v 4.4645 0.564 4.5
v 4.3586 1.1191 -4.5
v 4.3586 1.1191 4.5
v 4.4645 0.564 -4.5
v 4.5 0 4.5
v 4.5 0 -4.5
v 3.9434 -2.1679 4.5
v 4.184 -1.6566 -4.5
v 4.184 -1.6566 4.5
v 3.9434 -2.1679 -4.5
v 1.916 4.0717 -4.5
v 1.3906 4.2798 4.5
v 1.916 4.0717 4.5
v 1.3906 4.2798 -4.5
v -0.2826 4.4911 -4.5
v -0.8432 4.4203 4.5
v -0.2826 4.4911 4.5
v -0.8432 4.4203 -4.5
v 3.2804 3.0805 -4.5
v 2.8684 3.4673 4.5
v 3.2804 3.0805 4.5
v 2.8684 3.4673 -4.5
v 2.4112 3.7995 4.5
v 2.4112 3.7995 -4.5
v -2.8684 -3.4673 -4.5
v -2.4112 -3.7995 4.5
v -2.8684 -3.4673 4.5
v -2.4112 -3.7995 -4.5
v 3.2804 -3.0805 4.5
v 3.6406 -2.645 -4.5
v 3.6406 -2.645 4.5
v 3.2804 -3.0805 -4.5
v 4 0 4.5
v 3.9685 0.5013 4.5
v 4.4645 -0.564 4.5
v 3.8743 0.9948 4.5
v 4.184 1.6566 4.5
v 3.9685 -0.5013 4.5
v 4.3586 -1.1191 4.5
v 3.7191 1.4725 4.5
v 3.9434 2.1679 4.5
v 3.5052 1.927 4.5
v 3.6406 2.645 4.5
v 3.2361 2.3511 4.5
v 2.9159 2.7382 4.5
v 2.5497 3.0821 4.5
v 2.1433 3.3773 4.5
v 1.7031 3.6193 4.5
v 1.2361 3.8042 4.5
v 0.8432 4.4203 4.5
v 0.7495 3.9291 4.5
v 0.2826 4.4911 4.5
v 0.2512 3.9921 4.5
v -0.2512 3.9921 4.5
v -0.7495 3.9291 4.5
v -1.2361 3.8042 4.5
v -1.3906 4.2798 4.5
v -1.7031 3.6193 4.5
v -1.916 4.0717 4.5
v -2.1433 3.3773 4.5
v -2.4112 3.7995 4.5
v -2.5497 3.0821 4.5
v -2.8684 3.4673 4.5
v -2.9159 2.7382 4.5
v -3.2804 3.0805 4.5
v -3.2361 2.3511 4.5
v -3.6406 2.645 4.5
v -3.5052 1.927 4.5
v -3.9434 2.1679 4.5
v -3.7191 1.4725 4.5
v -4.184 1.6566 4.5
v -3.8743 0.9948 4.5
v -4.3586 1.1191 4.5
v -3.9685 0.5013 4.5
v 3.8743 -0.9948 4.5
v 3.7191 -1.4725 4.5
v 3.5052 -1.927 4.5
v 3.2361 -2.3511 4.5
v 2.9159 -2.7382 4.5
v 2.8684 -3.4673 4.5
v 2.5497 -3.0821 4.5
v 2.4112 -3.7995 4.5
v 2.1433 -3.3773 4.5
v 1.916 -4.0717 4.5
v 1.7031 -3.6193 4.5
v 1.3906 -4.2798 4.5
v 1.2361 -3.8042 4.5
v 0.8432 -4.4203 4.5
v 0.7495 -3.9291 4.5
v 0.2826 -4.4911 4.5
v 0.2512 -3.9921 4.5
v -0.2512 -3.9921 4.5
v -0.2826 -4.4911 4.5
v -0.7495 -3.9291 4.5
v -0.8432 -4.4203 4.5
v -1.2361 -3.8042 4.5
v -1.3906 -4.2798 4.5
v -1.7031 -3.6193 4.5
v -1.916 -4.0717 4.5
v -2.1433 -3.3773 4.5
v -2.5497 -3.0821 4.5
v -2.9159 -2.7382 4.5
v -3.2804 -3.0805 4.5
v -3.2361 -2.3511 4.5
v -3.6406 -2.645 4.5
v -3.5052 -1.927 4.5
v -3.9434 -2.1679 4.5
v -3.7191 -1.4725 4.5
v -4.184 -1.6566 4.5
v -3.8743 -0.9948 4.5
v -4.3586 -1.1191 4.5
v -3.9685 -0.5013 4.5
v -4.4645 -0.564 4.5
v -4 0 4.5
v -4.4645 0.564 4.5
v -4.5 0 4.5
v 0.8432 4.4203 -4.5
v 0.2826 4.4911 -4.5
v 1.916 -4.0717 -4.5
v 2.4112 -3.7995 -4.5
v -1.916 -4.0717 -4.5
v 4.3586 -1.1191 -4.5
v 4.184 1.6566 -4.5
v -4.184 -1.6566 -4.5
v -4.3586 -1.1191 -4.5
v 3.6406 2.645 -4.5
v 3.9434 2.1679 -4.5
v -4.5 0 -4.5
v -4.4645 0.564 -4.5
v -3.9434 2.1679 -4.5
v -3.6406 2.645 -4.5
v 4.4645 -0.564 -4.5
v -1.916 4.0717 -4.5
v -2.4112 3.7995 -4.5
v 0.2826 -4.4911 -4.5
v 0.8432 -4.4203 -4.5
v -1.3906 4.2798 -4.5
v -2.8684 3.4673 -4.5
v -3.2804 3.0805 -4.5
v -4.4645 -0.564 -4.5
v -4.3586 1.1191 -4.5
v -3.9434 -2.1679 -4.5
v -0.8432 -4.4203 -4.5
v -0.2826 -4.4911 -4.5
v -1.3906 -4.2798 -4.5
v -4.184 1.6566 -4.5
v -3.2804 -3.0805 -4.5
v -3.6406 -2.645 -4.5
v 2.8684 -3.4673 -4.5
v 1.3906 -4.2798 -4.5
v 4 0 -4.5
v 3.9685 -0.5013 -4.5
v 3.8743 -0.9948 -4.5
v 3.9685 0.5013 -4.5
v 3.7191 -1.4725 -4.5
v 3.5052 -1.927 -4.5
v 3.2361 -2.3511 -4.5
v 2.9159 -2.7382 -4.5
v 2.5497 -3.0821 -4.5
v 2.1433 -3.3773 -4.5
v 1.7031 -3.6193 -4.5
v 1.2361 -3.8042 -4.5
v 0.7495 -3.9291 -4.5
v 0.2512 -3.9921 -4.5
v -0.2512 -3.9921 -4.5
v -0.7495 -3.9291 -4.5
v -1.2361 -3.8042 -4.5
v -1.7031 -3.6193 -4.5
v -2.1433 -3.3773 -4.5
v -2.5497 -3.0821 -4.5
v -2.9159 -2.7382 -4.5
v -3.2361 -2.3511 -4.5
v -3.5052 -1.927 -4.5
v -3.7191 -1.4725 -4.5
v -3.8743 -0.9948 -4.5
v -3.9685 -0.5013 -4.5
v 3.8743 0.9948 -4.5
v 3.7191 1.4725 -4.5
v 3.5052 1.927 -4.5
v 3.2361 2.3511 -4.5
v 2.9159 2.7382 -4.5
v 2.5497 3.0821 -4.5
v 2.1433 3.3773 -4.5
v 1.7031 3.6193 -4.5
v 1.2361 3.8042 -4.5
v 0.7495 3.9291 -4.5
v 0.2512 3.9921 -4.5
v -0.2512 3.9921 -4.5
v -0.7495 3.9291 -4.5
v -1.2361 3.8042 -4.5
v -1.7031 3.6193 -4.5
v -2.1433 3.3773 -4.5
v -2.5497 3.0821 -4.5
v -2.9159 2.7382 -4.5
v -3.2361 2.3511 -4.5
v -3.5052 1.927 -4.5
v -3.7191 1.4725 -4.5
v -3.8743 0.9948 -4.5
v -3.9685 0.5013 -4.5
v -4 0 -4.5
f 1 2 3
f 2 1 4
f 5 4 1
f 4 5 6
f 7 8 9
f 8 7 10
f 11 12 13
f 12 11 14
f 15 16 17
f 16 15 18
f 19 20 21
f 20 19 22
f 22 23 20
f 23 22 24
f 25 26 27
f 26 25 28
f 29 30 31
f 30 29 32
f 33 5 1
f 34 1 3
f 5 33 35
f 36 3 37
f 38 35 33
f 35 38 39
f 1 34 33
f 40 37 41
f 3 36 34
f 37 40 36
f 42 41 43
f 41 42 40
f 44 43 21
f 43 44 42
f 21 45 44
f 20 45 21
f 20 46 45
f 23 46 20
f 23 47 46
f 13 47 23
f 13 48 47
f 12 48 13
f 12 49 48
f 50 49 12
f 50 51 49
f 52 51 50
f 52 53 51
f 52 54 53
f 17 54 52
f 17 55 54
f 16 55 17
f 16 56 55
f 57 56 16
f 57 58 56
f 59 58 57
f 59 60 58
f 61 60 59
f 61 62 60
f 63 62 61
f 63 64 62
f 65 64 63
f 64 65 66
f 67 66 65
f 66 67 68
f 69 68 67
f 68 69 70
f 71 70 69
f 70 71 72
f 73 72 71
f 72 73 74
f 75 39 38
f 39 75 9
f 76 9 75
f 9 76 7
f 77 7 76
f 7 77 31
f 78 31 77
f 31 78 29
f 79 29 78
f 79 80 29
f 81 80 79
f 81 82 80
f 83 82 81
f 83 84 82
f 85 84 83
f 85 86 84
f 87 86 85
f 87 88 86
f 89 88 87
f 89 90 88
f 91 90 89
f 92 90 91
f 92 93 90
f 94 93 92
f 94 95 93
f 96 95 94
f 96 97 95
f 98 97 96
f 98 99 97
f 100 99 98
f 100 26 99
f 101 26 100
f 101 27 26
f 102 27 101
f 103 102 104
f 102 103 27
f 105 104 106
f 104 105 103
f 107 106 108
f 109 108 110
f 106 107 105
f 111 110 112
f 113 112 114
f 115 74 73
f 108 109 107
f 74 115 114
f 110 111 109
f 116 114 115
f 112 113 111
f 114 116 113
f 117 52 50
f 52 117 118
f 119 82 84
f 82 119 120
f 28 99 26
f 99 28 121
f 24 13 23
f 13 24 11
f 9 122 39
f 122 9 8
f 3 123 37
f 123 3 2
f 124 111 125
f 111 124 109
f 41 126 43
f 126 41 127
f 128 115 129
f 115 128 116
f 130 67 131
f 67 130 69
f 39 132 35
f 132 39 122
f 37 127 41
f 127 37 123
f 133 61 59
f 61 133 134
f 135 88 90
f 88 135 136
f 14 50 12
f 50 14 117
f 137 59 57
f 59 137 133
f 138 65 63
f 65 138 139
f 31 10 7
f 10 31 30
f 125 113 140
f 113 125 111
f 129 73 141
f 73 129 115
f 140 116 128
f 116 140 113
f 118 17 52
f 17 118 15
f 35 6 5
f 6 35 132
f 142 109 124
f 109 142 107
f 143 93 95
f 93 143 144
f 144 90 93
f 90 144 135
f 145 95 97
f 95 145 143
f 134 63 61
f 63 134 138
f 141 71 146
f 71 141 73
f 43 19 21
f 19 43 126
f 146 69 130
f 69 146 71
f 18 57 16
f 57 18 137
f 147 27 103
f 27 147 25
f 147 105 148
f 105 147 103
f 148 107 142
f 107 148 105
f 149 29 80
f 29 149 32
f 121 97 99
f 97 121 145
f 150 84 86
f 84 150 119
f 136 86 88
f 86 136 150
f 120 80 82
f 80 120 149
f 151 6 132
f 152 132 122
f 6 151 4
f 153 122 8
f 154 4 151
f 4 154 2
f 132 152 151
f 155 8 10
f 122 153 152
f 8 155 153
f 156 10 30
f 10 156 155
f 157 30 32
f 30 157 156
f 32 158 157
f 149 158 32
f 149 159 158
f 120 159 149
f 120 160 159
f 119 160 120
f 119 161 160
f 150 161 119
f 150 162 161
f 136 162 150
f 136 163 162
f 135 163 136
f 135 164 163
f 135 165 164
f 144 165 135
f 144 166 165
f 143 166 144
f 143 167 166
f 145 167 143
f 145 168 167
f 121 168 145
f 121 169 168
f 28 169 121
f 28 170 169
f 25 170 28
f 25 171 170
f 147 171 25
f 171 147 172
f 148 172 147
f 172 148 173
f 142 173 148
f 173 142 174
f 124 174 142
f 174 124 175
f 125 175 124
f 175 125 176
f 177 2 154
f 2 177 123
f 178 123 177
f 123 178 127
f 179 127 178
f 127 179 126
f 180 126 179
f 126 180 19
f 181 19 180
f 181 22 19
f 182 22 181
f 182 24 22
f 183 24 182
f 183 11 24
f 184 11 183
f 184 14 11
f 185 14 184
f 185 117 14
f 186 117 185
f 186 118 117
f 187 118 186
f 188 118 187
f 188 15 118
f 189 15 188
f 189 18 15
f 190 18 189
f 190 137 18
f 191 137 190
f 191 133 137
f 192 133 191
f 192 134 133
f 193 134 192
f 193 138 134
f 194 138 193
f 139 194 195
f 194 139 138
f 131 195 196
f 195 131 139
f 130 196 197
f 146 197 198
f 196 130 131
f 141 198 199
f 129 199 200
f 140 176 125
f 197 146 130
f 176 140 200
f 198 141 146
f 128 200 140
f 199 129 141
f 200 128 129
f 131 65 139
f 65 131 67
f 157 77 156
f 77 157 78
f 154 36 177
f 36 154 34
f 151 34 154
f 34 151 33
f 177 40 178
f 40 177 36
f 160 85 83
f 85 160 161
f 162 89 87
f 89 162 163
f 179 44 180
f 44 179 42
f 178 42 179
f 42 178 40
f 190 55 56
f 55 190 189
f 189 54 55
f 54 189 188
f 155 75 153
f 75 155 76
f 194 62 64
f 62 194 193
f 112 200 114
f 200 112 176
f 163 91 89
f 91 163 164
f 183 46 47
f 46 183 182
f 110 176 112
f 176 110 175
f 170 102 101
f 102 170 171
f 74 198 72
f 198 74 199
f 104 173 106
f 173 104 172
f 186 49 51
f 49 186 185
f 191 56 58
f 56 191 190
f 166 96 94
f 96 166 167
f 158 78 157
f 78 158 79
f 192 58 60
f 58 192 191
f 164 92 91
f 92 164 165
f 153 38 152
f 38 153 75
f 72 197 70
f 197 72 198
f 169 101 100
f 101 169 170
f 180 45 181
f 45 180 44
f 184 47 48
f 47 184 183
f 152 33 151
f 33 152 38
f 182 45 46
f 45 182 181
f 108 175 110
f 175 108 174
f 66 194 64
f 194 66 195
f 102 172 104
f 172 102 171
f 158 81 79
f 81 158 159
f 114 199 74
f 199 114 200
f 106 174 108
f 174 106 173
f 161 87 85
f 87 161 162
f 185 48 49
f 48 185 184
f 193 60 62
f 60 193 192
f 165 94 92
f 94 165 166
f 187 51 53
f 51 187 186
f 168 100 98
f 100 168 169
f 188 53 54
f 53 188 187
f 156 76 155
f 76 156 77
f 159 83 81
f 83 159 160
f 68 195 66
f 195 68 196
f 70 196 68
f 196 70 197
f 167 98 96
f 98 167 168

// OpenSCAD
$fn = 50;


difference() {
	union() {
		translate(v = [0, 0, -4.5000000000]) {
			cylinder(h = 9, r = 4.5000000000);
		}
	}
	union() {
		translate(v = [0, 0, -100.0000000000]) {
			cylinder(h = 200, r = 4.0000000000);
		}
	}
}
